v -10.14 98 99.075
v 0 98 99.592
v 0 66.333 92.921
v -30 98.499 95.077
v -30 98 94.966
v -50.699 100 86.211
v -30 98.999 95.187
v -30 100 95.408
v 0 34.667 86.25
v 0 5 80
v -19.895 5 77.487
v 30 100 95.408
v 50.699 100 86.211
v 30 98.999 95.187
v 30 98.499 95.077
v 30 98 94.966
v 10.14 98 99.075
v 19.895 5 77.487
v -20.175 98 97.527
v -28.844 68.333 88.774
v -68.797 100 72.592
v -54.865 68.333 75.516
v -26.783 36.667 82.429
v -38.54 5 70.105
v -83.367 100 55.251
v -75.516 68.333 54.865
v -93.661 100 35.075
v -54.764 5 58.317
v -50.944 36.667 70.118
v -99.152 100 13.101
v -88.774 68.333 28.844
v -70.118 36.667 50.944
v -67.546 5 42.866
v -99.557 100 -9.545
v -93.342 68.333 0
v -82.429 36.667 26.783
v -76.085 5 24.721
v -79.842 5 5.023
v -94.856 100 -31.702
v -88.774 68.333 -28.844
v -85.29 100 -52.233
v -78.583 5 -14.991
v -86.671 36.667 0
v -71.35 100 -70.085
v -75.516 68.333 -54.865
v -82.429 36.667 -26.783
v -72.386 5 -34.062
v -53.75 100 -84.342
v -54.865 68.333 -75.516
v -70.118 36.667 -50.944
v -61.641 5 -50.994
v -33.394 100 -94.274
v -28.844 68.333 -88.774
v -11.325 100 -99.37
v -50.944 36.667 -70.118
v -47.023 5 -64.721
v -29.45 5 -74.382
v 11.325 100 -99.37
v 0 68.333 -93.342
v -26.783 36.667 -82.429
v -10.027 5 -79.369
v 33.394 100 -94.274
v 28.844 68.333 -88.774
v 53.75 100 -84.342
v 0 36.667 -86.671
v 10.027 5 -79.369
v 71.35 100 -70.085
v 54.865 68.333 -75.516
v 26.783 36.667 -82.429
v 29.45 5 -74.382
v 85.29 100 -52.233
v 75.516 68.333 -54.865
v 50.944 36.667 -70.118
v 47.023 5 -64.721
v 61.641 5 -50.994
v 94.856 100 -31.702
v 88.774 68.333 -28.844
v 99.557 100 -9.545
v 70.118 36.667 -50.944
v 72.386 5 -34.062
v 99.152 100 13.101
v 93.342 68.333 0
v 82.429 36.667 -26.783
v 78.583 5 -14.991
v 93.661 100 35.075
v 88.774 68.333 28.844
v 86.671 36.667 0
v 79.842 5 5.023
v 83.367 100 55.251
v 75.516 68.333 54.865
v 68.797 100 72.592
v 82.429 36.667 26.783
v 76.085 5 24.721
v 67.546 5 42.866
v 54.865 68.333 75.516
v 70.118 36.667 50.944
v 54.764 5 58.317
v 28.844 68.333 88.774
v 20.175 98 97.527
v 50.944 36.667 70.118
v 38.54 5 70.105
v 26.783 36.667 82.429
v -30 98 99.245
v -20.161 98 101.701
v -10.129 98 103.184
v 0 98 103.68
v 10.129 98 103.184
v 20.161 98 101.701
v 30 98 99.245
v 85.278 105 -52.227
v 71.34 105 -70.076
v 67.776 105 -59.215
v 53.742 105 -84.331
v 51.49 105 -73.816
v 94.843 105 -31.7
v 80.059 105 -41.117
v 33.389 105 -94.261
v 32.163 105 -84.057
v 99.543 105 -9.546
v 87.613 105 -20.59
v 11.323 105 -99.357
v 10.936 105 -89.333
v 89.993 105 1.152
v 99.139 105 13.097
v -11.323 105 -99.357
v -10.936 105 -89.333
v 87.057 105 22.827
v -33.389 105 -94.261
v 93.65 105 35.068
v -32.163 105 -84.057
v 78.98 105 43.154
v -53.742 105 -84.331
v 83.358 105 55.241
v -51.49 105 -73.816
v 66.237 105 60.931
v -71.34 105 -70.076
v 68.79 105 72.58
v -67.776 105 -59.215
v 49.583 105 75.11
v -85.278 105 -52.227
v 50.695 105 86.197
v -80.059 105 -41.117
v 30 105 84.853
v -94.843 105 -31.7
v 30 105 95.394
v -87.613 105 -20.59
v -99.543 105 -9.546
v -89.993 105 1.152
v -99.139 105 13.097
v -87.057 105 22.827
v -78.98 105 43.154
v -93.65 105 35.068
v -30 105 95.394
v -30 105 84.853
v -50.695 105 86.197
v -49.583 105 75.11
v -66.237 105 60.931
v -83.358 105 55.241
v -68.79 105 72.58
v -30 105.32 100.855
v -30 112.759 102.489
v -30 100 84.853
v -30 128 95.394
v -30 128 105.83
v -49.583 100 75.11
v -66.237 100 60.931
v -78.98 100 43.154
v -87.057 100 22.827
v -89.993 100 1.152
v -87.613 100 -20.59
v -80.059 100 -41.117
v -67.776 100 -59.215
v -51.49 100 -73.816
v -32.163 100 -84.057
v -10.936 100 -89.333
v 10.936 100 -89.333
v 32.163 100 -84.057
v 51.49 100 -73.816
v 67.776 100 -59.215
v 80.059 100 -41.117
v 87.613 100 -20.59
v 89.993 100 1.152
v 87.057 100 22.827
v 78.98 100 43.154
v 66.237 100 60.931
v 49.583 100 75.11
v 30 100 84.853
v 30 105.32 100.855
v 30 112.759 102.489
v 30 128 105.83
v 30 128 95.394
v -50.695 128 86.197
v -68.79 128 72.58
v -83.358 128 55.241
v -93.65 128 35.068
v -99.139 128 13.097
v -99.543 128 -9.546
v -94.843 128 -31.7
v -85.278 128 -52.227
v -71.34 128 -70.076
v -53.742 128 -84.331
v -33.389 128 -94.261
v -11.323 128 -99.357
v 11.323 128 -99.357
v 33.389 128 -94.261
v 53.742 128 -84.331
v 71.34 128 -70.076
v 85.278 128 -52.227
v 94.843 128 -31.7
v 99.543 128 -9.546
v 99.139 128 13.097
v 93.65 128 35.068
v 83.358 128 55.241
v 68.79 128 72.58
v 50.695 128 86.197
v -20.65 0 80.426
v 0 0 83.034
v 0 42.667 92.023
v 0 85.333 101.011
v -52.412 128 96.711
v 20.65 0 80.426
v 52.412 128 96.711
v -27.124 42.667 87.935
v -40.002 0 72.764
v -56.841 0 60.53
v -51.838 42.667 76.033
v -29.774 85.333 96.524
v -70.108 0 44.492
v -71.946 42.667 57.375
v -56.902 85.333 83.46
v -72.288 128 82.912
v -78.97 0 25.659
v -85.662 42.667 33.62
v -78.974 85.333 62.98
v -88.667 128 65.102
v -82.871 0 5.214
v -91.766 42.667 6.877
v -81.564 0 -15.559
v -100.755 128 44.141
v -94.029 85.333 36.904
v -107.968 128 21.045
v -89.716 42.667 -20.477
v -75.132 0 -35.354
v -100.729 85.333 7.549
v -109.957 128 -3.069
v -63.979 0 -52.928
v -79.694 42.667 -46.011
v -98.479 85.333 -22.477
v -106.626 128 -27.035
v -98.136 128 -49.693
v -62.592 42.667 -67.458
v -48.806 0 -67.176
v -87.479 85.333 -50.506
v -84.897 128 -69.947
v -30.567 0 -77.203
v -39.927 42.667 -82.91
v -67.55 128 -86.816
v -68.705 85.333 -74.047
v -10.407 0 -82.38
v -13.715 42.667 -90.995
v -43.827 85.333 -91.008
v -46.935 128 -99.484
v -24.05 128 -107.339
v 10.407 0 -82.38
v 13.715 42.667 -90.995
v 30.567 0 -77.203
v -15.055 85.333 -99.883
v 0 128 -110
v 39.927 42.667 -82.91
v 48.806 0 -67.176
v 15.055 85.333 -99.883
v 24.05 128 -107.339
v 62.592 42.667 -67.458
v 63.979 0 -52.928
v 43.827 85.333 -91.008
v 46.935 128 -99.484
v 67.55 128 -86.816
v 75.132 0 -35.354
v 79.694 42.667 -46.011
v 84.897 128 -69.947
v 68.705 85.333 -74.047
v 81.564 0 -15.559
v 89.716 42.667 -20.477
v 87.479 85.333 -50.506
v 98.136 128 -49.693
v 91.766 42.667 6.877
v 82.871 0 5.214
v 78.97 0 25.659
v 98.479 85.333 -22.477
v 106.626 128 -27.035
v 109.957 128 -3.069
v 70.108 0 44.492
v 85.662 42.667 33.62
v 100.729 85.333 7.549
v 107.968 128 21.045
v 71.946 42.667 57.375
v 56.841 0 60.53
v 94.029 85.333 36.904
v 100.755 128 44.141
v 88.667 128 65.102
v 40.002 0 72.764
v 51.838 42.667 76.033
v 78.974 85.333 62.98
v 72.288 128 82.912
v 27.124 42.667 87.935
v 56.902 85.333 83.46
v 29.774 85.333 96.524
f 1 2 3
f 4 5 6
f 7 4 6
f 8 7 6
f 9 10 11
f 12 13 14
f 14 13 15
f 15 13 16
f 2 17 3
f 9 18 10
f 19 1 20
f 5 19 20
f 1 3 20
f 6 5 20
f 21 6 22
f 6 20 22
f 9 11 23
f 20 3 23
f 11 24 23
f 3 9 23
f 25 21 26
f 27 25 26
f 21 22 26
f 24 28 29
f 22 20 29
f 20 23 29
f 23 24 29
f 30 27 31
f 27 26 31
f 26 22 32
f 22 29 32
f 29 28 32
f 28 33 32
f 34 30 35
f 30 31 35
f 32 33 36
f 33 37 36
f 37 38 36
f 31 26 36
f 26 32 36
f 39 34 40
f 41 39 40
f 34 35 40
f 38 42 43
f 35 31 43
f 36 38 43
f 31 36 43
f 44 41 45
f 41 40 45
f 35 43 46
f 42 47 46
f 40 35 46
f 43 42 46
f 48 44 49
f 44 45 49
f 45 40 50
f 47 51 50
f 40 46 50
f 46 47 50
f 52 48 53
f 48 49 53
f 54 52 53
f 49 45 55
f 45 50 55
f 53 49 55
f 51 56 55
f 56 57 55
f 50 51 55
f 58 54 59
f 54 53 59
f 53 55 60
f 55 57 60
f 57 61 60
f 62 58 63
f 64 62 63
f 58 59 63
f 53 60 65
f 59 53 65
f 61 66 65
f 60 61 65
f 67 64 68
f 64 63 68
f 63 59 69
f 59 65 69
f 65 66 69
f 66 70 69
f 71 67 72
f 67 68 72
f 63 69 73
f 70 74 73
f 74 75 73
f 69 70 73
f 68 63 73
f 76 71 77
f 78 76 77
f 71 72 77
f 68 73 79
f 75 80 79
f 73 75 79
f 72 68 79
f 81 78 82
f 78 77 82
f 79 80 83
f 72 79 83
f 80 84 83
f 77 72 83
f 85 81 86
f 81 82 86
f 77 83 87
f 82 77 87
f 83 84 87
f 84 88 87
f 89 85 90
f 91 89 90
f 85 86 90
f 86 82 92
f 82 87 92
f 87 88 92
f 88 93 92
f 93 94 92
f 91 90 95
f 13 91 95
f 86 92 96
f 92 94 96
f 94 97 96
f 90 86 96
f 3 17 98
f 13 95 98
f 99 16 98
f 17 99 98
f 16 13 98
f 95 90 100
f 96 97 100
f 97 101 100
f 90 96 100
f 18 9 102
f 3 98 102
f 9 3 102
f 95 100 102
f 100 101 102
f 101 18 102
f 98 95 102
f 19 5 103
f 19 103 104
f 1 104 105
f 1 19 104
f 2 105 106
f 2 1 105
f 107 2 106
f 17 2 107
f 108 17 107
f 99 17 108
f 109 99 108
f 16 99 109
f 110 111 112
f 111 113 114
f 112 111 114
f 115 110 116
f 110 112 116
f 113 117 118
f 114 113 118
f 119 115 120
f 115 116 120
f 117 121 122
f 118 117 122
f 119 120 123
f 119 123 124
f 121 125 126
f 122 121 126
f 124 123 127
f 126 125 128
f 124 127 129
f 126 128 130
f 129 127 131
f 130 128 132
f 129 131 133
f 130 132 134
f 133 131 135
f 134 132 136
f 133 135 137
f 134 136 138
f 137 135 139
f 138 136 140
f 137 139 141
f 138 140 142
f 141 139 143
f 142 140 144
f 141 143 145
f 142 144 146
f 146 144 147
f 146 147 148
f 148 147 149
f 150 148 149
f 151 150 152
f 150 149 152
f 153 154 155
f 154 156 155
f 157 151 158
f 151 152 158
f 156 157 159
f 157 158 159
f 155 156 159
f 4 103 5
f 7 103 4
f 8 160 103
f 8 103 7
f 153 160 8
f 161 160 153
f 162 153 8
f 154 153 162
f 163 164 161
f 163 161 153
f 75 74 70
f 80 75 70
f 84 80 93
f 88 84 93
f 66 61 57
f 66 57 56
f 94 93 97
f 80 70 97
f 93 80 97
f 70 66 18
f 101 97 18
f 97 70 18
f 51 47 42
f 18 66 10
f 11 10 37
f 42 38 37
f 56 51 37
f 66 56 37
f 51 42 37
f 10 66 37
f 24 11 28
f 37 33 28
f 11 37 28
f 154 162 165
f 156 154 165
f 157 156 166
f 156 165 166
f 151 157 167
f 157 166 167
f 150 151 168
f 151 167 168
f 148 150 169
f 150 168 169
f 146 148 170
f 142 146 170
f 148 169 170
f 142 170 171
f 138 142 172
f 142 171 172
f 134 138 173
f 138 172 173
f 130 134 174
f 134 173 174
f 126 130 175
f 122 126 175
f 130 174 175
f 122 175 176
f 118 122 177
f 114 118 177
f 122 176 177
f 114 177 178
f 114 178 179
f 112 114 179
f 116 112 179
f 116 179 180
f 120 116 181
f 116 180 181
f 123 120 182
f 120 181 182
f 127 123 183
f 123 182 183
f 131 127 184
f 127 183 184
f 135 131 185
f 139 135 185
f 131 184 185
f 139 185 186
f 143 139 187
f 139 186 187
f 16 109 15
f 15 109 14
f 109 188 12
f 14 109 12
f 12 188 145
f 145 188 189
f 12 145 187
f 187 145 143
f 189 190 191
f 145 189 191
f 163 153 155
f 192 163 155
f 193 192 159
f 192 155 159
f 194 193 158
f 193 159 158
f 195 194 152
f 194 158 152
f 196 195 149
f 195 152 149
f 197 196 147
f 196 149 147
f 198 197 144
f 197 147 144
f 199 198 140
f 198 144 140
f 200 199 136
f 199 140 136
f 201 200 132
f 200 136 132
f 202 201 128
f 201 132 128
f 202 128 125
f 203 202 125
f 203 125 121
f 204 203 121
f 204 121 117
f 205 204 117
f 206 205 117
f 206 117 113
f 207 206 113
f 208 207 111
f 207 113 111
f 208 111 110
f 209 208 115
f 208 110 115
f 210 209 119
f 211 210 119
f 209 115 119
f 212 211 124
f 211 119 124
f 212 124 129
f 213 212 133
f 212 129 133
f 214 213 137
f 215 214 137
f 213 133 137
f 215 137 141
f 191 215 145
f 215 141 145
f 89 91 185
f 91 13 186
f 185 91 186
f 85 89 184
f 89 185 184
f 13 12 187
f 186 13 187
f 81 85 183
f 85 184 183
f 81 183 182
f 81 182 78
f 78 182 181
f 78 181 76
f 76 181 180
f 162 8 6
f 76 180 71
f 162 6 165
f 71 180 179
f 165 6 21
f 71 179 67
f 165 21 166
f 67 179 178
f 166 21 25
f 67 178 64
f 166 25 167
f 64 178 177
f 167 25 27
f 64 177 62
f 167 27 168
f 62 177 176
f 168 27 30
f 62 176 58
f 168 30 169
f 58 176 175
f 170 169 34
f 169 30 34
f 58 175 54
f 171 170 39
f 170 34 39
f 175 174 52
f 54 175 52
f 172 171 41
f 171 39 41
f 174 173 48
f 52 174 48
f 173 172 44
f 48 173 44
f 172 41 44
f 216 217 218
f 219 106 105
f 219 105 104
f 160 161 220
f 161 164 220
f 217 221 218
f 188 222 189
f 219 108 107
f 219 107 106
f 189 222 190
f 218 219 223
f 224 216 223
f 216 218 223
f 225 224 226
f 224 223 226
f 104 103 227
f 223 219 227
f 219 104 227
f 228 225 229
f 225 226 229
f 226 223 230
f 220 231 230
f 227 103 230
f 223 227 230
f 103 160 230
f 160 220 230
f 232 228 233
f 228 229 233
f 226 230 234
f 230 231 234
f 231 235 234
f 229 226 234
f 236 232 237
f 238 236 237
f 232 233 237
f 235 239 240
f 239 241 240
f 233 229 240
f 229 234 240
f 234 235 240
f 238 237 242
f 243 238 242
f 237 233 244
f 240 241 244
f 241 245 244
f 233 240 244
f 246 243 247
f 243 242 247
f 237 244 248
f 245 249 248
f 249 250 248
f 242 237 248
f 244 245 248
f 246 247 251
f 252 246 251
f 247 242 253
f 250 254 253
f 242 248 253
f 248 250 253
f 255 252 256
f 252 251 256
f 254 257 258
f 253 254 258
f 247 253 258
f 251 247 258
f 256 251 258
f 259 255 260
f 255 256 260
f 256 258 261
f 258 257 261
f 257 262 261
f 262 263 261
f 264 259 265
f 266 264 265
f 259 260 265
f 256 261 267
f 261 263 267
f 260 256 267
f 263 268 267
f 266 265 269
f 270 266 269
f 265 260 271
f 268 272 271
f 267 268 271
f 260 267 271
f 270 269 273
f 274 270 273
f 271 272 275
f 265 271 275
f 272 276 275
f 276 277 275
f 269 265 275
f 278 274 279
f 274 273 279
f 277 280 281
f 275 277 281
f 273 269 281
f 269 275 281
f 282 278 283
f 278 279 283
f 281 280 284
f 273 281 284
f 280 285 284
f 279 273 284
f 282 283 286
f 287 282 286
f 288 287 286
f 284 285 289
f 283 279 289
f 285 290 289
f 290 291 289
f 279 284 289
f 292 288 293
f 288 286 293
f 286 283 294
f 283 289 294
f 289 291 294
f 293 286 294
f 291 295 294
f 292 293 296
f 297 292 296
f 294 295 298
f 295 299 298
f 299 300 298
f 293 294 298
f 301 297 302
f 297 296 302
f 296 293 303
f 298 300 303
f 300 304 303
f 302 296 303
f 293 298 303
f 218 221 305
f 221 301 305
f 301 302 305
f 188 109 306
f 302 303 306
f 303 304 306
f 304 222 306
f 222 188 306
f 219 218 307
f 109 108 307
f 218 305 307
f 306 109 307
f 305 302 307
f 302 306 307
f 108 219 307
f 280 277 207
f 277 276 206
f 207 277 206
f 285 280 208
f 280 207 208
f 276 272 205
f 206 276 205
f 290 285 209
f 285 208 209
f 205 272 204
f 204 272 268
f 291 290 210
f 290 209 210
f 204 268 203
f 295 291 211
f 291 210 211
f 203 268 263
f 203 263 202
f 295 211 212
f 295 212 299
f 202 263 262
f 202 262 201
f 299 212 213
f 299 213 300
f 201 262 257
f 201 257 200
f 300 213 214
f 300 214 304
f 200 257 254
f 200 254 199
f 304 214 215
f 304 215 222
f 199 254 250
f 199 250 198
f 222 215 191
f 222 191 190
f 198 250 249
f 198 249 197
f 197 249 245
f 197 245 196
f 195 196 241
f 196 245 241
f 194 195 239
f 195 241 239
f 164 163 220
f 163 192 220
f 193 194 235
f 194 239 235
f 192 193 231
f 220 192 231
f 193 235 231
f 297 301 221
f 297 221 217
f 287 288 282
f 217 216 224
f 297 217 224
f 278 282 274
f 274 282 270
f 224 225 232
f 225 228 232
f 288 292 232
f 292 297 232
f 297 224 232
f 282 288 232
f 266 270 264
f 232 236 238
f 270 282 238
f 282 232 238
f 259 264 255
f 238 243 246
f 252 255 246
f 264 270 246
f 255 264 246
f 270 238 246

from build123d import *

# Parameters (mm, degrees)
SKETCH_2_W          = 60
SKETCH_2_H          = 57.613168724
CUT_EXTRUDE_1_DEPTH = 30


with BuildPart() as part:
    # 草圖1 → 旋轉1 (revolve)
    with BuildSketch(Plane(origin=(0, 0, 0), x_dir=(0, 0, -1), z_dir=(1, 0, 0)), mode=Mode.PRIVATE) as revolve_1_sk:
        Polygon((0, 0), (83.034457175, 0), (110, 128), (100, 128), (100, 105), (90, 105), (90, 100), (100.013488815, 100), (80, 5), (0, 5), align=None)
    revolve(revolve_1_sk.sketch.rotate(Axis((0, 5, 0), (0, -1, 0)), 180), axis=Axis((0, 5, 0), (0, -1, 0)))

    # 草圖2 → 除料-伸長1 (cut)
    with BuildSketch(Plane(origin=(0, 128, 0), x_dir=(1, 0, 0), z_dir=(0, 1, 0))):
        with Locations((0, -98.621202087)):
            Rectangle(SKETCH_2_W, SKETCH_2_H)
    extrude(amount=-CUT_EXTRUDE_1_DEPTH, mode=Mode.SUBTRACT)


solid = part.part
